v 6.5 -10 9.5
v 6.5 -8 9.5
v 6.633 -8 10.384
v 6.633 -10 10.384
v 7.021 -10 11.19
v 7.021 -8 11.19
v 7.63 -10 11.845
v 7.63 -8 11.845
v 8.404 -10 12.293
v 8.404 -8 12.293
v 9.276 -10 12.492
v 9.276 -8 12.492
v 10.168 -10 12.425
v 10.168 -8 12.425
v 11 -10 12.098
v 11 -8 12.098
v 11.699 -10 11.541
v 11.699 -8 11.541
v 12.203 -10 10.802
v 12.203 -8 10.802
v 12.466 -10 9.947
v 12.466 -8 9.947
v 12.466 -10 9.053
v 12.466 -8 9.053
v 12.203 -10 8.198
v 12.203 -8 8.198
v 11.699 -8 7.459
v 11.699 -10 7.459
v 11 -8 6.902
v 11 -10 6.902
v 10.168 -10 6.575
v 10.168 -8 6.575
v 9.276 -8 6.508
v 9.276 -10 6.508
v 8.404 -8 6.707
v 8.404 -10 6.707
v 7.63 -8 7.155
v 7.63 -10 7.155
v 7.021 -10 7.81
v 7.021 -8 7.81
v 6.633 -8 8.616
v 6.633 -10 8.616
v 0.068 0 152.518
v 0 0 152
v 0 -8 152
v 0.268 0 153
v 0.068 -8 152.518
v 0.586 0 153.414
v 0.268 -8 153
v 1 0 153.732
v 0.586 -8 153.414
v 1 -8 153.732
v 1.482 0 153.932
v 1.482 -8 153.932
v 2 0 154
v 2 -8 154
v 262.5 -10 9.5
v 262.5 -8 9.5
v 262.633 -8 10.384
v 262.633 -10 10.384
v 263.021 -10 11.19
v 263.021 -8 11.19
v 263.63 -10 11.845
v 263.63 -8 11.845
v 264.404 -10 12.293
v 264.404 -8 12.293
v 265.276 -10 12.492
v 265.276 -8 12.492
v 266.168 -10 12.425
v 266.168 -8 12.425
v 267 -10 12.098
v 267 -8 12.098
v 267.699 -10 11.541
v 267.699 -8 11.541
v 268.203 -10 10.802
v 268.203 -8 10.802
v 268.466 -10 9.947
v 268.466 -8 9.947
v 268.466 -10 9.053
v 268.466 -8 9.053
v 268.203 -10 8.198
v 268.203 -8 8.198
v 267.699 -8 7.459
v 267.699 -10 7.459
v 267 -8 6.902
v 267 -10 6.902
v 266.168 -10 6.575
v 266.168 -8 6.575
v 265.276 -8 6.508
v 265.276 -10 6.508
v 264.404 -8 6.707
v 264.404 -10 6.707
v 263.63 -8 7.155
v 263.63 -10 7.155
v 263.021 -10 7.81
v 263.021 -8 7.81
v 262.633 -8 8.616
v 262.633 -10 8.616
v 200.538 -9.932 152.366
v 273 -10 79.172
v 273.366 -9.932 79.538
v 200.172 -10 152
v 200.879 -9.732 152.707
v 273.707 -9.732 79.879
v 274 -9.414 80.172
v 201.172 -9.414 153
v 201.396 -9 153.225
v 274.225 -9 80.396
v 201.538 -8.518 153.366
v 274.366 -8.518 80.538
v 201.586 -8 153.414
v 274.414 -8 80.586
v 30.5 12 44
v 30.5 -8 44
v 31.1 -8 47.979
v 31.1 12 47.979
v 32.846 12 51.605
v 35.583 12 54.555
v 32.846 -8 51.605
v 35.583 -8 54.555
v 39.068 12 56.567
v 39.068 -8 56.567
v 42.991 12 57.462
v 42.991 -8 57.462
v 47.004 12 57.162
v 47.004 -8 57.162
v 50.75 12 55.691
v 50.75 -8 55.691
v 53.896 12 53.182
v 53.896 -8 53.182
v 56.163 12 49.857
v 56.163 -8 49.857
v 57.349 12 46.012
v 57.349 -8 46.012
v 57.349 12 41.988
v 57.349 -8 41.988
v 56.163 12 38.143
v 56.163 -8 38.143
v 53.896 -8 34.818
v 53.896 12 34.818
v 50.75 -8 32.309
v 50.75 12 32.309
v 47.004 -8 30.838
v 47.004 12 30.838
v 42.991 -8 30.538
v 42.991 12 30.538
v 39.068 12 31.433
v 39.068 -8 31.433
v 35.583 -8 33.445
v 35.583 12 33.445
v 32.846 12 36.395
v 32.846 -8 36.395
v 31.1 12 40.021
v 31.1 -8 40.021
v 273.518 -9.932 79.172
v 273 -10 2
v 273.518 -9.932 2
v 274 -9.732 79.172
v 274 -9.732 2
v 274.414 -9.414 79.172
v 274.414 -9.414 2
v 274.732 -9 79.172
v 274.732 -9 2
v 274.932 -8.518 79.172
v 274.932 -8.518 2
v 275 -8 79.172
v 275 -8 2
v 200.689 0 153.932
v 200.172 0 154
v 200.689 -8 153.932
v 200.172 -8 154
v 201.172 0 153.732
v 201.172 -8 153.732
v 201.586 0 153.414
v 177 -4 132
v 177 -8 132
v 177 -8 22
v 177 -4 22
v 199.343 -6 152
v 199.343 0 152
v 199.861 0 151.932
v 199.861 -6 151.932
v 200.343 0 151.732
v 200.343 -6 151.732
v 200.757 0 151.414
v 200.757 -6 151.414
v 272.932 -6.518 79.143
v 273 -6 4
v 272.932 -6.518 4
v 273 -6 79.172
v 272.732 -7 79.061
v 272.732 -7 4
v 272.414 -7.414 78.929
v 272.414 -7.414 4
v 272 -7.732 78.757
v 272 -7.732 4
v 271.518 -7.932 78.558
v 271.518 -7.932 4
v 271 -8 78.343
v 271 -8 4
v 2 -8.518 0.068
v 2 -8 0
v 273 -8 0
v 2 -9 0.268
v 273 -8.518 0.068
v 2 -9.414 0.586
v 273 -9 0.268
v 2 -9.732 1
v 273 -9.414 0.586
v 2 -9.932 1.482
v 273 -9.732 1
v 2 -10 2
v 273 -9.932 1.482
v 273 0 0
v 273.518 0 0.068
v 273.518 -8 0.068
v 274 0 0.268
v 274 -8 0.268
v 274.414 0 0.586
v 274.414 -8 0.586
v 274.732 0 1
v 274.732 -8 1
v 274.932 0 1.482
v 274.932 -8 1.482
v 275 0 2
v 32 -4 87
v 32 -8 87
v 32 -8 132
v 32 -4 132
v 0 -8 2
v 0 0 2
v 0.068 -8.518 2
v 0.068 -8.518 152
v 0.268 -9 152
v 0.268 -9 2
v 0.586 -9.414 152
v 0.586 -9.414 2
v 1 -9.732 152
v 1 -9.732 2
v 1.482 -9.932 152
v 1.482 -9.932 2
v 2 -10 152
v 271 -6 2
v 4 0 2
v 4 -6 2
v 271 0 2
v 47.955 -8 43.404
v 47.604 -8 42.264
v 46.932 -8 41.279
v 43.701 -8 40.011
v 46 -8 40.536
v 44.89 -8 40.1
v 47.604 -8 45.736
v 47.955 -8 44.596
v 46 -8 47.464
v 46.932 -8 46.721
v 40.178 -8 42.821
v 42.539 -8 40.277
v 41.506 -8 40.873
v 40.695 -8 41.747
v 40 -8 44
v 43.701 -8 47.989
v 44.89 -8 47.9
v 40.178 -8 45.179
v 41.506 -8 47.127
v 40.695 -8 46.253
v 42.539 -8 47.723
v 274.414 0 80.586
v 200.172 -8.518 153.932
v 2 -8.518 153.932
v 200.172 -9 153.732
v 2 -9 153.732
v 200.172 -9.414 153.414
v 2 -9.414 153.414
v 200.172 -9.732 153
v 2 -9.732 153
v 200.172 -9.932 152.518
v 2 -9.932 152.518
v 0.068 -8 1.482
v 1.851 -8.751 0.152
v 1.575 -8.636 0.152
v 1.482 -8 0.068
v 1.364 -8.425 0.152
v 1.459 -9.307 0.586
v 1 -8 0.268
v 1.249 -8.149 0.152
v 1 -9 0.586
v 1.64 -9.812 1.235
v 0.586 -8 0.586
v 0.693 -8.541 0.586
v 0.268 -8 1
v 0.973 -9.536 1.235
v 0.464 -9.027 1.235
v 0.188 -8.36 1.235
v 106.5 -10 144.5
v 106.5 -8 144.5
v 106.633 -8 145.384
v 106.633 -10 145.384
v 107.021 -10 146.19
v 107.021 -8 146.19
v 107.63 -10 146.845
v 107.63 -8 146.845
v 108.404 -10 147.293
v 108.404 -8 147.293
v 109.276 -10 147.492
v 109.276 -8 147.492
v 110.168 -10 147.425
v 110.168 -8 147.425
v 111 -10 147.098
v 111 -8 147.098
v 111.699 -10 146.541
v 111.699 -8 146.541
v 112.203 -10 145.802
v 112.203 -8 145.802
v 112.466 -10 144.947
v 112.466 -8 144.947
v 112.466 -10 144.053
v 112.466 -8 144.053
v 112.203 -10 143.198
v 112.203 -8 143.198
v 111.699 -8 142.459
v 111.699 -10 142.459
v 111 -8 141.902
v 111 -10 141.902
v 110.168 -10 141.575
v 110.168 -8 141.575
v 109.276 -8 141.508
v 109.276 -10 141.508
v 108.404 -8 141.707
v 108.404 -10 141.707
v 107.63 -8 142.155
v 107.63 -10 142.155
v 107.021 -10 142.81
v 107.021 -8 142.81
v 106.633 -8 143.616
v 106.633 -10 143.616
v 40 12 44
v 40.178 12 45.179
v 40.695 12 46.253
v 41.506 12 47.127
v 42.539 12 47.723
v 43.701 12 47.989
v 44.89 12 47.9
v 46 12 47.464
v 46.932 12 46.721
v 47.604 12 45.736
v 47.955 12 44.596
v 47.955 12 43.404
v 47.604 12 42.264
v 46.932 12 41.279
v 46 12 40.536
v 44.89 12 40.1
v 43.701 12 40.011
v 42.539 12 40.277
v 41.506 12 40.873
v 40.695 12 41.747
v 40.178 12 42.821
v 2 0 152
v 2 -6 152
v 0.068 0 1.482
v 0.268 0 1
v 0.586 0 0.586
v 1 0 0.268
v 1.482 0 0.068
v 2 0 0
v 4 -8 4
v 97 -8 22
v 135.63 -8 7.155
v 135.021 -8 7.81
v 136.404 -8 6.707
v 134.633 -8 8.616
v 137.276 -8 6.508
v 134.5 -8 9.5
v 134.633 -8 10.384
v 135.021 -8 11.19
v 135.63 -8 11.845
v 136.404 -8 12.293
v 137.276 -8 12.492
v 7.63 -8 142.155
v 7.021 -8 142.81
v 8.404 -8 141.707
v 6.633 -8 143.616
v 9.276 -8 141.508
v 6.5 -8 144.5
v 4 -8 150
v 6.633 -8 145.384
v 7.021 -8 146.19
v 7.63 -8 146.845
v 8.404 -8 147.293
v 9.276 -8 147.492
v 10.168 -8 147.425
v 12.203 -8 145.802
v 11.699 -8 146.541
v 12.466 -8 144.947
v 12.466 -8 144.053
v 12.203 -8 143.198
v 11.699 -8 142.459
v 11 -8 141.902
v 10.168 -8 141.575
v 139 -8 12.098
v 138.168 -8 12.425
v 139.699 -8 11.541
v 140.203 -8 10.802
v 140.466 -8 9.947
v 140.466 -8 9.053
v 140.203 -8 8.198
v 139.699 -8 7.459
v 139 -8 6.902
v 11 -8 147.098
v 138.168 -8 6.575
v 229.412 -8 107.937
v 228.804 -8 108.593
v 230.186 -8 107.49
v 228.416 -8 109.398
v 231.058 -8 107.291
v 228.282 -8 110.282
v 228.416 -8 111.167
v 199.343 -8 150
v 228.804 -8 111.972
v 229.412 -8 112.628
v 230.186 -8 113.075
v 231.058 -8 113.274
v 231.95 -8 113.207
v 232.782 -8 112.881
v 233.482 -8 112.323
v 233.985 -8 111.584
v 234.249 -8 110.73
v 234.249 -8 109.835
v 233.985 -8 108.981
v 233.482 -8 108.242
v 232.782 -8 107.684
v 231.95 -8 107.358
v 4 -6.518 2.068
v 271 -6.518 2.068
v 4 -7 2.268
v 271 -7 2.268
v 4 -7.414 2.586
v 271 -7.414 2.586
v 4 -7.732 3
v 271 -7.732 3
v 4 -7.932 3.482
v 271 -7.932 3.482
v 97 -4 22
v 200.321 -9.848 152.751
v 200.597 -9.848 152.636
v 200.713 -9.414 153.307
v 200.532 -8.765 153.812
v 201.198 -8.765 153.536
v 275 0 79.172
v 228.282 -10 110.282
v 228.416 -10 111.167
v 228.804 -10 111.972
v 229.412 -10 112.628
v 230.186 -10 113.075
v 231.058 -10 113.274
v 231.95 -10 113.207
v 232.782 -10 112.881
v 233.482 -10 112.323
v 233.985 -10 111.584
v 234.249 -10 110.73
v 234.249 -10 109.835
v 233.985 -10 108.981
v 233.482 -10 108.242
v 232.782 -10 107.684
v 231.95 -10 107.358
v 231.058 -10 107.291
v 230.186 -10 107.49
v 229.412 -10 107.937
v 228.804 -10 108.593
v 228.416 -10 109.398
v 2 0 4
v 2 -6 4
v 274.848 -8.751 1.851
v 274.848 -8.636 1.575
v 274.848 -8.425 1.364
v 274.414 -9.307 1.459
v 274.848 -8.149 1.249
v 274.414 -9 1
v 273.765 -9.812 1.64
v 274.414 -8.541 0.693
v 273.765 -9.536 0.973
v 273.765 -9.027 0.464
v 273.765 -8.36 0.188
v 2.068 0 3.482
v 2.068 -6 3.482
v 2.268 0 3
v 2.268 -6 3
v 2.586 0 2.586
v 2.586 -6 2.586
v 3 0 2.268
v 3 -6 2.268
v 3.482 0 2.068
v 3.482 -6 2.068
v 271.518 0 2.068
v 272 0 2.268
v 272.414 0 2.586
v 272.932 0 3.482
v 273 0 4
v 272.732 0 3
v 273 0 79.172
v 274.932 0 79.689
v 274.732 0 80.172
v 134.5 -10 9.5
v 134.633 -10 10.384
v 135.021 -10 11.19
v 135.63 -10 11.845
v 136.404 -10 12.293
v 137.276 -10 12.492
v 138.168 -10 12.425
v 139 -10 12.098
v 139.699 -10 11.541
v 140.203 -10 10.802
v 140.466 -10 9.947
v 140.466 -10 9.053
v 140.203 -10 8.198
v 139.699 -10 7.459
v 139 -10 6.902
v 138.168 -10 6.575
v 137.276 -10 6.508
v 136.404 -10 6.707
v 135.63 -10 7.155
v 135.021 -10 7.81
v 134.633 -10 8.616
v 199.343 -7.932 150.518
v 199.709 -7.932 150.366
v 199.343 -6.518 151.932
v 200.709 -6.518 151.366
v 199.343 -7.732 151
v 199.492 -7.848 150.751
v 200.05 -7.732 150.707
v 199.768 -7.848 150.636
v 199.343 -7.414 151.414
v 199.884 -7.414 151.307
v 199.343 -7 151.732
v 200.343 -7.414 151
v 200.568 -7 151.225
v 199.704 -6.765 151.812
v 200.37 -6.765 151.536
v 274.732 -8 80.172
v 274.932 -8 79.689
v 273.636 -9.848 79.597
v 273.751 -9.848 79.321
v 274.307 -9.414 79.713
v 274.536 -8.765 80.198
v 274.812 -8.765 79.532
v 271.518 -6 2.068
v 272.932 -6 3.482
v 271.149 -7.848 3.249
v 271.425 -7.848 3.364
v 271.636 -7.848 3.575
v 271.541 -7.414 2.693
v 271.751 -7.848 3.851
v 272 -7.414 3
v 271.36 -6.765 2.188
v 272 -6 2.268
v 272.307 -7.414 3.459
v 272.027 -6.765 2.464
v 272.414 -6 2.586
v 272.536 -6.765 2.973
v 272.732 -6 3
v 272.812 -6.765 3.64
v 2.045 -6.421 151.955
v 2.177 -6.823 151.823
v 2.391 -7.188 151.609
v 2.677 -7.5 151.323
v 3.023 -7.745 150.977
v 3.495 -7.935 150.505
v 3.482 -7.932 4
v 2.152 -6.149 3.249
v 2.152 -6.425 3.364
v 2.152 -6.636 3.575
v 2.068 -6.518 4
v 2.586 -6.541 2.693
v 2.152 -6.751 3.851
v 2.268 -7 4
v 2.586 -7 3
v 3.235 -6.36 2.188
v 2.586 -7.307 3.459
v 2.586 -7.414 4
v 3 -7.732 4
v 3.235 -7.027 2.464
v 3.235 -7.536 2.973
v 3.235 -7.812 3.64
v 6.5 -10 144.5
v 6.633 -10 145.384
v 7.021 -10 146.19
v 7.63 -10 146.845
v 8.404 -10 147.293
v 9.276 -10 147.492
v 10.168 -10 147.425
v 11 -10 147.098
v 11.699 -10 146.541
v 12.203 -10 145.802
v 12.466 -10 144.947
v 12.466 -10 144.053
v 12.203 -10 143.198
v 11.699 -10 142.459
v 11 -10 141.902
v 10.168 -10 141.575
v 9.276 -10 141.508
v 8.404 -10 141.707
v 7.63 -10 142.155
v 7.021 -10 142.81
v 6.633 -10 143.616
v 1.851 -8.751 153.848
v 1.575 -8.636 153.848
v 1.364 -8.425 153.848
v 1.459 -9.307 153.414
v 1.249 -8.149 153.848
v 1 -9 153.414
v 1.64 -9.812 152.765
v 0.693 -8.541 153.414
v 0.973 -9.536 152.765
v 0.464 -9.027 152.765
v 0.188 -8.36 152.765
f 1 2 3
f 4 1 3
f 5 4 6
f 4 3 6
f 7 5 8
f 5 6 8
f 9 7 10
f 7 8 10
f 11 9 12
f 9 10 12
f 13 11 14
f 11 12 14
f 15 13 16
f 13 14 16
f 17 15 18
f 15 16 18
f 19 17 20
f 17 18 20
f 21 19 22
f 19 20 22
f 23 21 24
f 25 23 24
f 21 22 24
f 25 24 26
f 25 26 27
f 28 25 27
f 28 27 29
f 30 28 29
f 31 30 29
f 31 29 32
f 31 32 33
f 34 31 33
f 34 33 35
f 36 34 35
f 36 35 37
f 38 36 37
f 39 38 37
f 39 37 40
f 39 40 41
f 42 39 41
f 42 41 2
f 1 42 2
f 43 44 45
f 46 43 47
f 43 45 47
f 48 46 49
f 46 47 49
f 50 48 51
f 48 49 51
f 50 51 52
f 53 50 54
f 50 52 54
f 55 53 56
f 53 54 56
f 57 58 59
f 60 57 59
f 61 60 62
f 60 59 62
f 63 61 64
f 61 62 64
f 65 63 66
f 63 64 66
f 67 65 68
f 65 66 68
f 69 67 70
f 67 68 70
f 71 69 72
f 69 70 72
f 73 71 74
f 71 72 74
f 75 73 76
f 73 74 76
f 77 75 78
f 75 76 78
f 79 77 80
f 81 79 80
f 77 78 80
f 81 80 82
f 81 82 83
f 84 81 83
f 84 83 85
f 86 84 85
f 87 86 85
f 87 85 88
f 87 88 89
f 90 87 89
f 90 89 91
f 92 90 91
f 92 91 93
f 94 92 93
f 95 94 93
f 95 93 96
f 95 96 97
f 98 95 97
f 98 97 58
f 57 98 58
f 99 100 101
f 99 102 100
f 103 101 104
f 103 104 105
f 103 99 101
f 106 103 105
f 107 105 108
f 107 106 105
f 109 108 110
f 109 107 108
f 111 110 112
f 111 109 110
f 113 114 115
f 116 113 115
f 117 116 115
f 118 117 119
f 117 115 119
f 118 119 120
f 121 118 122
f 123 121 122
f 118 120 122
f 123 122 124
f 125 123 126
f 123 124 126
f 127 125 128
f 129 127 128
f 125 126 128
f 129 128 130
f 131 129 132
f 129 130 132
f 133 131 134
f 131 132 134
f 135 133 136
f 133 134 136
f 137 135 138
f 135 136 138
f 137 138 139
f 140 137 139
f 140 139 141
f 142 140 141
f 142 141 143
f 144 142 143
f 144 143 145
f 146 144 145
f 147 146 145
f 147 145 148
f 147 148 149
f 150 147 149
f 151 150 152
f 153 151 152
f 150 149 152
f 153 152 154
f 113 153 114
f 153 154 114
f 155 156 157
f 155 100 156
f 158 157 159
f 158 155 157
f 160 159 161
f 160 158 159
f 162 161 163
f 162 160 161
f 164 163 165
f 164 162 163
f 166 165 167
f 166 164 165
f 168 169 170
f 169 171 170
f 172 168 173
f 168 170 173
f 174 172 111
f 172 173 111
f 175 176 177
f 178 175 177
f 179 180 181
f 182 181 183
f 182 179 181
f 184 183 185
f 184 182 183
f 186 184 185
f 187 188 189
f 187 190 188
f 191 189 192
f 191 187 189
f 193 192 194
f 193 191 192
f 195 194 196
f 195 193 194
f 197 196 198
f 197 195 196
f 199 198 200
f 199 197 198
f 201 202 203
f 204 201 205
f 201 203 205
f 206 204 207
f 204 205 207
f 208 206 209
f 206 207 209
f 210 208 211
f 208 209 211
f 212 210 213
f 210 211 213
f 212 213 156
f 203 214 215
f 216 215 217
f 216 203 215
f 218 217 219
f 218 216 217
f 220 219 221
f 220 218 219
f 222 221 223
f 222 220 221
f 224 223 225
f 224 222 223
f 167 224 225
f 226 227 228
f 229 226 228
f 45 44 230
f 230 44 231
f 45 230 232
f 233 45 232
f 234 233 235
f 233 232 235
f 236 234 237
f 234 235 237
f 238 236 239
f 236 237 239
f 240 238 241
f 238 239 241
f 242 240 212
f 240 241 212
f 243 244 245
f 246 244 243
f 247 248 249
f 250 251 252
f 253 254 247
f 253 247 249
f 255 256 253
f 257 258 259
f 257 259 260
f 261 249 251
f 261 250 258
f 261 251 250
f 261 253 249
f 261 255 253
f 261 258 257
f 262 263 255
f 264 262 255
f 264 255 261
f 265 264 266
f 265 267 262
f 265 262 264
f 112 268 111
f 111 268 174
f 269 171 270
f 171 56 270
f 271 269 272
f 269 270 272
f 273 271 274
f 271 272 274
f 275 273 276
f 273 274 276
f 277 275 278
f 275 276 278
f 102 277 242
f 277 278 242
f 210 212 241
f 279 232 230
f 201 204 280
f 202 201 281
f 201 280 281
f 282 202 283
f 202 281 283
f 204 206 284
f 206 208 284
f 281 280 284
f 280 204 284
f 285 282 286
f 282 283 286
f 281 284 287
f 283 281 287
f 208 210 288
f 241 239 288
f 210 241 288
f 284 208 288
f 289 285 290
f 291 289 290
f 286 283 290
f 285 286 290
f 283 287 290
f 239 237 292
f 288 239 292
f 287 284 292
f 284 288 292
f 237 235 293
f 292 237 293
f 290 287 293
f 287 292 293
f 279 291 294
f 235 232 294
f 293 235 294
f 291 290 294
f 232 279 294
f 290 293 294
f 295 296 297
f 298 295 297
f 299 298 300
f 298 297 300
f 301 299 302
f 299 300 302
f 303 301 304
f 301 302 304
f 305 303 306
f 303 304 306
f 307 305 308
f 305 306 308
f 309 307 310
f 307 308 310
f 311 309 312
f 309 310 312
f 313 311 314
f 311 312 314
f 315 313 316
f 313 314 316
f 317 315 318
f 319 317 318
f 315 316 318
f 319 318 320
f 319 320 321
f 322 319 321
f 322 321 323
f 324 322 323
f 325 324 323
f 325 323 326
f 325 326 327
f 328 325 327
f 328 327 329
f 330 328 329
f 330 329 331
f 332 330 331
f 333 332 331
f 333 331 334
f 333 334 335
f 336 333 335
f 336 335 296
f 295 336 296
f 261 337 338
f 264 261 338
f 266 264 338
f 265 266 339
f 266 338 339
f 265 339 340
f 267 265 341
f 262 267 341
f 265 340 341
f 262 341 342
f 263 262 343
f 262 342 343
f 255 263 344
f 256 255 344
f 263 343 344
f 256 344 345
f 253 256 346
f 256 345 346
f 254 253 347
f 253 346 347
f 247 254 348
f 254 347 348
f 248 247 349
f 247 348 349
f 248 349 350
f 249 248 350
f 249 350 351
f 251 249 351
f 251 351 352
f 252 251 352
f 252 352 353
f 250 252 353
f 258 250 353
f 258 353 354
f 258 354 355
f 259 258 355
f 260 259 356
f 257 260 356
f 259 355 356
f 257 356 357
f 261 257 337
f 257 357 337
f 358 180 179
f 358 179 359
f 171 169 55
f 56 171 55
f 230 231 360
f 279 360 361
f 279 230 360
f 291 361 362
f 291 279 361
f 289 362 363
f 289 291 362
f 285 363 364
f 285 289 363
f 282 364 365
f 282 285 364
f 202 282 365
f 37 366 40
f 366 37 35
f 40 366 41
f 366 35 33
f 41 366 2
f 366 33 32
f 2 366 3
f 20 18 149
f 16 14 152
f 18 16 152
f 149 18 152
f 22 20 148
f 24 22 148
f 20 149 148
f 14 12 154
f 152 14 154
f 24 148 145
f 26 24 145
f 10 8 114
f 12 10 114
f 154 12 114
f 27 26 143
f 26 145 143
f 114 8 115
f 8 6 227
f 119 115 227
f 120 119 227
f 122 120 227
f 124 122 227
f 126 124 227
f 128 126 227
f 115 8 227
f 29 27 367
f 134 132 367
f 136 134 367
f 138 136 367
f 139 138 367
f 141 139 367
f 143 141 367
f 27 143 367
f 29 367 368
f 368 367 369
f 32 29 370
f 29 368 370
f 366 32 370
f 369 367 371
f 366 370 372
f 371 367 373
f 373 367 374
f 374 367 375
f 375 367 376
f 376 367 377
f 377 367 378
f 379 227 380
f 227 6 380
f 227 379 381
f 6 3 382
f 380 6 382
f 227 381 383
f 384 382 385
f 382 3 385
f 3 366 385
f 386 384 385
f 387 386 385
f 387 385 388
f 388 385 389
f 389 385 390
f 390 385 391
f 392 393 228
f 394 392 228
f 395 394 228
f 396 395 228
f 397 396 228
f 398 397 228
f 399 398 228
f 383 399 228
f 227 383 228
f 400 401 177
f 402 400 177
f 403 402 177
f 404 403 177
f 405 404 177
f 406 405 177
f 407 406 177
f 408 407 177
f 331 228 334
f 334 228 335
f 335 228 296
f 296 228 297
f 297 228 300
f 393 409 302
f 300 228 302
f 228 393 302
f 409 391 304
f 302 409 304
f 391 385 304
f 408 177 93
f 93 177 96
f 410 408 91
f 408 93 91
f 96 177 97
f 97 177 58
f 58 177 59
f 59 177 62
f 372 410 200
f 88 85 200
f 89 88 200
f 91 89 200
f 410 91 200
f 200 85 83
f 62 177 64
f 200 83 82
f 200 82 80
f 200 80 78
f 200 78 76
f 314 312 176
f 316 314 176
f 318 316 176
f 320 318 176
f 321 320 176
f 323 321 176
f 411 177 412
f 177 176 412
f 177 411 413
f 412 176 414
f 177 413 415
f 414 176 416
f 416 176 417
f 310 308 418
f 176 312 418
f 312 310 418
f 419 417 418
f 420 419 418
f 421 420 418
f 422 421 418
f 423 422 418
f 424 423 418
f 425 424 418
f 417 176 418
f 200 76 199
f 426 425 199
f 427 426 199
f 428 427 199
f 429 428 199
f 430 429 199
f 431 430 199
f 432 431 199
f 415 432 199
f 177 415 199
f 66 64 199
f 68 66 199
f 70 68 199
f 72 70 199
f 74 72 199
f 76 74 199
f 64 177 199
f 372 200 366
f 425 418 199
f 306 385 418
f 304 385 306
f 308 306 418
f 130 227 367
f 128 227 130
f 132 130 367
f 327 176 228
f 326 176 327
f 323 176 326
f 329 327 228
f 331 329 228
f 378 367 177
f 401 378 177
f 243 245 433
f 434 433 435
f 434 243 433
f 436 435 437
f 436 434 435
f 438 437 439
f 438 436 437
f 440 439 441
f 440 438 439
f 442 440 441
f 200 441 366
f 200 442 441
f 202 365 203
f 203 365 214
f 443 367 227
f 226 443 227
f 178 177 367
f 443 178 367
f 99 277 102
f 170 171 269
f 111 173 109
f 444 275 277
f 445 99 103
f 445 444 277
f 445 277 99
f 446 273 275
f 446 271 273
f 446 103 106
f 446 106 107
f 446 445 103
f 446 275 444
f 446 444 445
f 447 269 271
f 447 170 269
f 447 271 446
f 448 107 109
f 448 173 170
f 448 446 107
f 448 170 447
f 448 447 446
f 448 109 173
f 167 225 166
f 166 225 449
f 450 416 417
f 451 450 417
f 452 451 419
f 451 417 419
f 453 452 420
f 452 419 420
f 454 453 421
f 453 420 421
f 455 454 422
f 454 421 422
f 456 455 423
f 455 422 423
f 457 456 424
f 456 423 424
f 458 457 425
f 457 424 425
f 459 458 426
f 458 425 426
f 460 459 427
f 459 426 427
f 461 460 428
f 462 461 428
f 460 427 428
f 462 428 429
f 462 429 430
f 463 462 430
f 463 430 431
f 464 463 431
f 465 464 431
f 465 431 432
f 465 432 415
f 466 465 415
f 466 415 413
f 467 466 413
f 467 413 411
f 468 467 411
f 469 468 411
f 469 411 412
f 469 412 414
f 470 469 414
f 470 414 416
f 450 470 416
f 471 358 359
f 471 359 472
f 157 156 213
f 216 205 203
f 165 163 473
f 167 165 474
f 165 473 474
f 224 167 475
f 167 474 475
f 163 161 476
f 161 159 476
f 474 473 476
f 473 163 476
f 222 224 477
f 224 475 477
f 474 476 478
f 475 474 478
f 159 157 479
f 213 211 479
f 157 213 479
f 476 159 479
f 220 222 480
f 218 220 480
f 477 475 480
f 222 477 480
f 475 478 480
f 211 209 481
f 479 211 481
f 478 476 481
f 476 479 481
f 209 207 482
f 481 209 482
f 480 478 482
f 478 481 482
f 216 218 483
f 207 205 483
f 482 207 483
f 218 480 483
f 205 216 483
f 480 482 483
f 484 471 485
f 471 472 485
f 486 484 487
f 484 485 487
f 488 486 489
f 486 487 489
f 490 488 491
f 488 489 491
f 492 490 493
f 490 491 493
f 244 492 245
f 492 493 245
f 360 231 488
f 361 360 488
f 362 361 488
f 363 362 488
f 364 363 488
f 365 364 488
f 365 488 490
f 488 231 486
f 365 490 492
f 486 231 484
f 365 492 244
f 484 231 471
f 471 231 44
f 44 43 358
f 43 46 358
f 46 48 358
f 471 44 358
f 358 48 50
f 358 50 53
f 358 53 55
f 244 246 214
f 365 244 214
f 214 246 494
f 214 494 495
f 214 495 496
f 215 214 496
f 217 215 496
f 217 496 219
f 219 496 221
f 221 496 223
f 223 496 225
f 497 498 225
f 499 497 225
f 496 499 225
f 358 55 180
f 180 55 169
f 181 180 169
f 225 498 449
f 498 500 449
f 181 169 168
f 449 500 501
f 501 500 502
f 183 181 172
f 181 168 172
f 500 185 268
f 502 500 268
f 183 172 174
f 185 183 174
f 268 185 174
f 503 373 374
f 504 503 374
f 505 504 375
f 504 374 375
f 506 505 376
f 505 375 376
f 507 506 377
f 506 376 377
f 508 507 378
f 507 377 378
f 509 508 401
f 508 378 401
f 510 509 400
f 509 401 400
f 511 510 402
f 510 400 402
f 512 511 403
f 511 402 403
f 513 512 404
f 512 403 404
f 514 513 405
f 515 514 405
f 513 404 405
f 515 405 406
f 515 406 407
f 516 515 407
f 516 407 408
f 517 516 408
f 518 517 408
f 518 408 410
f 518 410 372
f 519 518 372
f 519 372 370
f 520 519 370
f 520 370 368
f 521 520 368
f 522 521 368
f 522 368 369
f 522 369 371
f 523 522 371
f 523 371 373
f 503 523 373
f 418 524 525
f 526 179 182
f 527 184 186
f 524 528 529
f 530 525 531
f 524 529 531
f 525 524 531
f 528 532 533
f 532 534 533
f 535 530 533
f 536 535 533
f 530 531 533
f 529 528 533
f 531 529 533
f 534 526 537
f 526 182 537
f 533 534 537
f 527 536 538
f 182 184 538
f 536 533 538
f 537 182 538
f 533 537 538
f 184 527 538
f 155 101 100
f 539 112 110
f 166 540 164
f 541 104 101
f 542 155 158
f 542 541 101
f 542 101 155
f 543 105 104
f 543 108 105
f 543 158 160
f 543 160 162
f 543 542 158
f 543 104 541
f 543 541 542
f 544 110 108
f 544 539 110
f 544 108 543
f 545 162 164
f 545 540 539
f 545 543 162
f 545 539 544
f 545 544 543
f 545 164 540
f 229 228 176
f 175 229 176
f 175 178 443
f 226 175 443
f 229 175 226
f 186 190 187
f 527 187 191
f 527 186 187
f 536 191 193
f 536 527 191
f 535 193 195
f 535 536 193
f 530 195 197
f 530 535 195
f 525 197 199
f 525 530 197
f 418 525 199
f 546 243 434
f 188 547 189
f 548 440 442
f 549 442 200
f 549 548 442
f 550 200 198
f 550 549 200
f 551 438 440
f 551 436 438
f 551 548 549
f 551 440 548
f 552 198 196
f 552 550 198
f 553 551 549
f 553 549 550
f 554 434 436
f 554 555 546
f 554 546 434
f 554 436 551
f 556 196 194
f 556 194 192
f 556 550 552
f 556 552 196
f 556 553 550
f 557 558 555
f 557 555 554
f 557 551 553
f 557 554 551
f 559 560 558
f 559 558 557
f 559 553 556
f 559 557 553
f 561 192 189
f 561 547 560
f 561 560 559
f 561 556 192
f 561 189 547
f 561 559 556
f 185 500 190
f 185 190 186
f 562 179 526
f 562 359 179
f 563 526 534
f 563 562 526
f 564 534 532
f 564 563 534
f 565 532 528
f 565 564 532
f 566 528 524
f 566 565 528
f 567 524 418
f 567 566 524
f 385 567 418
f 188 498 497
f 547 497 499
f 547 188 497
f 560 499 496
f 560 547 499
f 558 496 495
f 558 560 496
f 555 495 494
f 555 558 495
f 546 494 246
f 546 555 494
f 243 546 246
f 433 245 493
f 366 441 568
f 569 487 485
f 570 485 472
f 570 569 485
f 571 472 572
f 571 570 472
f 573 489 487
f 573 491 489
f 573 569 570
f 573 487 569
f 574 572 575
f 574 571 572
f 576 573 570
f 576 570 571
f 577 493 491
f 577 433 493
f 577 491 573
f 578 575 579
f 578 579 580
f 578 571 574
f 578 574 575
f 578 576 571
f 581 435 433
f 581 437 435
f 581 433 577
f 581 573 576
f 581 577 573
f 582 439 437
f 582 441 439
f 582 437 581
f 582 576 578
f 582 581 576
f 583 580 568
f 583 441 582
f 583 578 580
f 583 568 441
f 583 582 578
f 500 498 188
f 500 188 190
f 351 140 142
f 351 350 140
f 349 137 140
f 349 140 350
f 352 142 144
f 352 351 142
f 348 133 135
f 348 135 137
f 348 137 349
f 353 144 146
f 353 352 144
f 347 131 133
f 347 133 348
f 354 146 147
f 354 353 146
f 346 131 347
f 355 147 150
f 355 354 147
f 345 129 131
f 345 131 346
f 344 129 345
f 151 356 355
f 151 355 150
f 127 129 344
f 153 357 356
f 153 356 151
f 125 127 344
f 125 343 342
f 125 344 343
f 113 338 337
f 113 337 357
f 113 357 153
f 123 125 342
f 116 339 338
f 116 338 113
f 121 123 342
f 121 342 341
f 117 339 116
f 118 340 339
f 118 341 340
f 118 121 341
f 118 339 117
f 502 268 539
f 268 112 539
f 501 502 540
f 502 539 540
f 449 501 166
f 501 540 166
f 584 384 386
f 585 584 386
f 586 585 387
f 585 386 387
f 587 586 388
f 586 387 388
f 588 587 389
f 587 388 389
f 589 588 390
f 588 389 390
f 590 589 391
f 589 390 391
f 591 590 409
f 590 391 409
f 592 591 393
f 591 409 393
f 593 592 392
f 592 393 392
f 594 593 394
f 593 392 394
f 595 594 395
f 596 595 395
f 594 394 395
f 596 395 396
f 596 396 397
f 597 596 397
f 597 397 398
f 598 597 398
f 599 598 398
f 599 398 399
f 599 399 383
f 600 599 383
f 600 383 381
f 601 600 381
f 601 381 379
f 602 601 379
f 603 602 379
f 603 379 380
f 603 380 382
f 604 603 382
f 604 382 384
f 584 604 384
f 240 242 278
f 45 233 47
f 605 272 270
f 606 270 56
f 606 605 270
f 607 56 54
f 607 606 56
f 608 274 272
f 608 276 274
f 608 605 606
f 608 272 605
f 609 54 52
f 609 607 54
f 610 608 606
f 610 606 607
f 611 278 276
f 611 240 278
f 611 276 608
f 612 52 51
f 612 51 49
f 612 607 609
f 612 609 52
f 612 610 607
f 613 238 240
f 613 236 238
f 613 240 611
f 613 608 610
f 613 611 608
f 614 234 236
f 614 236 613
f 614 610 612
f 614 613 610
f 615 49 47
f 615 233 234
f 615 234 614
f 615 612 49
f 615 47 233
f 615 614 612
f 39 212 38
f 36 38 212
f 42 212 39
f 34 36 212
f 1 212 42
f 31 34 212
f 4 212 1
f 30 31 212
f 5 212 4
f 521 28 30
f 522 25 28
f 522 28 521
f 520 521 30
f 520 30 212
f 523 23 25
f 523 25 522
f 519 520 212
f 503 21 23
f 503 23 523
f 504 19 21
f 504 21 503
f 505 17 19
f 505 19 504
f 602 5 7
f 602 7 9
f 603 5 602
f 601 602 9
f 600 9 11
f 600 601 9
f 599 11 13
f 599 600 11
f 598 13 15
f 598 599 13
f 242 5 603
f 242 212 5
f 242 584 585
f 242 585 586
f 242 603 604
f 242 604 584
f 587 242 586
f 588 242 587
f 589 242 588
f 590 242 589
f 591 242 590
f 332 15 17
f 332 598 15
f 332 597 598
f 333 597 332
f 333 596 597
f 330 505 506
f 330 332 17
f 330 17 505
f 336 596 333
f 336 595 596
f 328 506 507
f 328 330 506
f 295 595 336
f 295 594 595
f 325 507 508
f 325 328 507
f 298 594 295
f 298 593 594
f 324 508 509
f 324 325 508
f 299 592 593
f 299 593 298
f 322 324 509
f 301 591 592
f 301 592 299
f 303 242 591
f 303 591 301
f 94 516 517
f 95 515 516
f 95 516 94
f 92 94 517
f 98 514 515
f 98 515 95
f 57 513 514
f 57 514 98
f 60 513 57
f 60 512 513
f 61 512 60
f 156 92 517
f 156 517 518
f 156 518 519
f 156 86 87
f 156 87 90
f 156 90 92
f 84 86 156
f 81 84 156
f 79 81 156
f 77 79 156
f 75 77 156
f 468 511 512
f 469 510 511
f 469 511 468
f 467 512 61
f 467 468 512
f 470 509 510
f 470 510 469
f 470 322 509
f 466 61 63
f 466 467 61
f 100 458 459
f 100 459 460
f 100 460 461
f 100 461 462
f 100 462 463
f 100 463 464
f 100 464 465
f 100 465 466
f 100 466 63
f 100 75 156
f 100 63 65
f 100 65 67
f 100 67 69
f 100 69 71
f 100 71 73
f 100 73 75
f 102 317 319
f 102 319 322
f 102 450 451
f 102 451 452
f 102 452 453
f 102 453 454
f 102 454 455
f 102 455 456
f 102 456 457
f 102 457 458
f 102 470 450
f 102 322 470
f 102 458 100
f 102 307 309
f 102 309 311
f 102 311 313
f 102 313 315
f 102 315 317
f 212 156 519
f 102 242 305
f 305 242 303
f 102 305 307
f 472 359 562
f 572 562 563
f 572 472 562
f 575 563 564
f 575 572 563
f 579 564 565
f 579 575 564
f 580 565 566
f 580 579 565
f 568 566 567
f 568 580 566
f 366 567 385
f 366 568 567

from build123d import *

# Parameters (mm, degrees)
F1_DEPTH = 10
F2_T     = -2
F5_DEPTH = 4
F6_R     = 13.5
F7_DEPTH = 20
F8_R     = 4
F9_DEPTH = 20
F11_D    = 6
F12_R    = 2
F13_R    = 2


with BuildPart() as f1:
    # F0 (on Front) → F1 (new body)
    with BuildSketch(Plane.XZ):
        Polygon((0, 154), (0, 0), (275, 0), (275, 80), (201, 154), align=None)
    extrude(amount=F1_DEPTH)

    # F2
    f2_openings = [f1.faces().sort_by_distance(p)[0] for p in [
        (129.700907, 0, 73.382695),
    ]]
    offset(amount=F2_T, openings=f2_openings)

    # F4 (on face) → F5 (join)
    with BuildSketch(Plane(origin=(0, -8, 0), x_dir=(-1, 0, 0), z_dir=(0, 1, 0))):
        Polygon((-32, 87), (-32, 132), (-177, 132), (-177, 22), (-97, 22), align=None)
    extrude(amount=F5_DEPTH)

    # F6 (on face) → F7 (join)
    with BuildSketch(Plane(origin=(0, -8, 0), x_dir=(-1, 0, 0), z_dir=(0, 1, 0))):
        with Locations((-44, 44)):
            Circle(F6_R)
    extrude(amount=F7_DEPTH)

    # F8 (on face) → F9 (cut, through all)
    with BuildSketch(Plane(origin=(0, 12, 0), x_dir=(-1, 0, 0), z_dir=(0, 1, 0))):
        with Locations((-44, 44)):
            Circle(F8_R)
    extrude(amount=-F9_DEPTH, mode=Mode.SUBTRACT)

    # F11 (through all)
    with Locations(Plane.XZ.offset(10)):
        with Locations((9.5, 144.5), (109.5, 144.5), (231.2824855787, 110.2824855787), (265.5, 9.5), (137.5, 9.5), (9.5, 9.5)):
            Hole(F11_D / 2)

    # F12
    f12_edges = [f1.edges().sort_by_distance(p)[0] for p in [
        (0, -10, 77),
        (137.5, -10, 0),
        (238, -10, 117),
        (275, -10, 40),
        (275, -5, 0),
        (275, -5, 80),
        (201, -5, 154),
        (0, -5, 0),
        (100.5, -10, 154),
        (0, -5, 154),
    ]]
    fillet(f12_edges, radius=F12_R)

    # F13
    f13_edges = [f1.edges().sort_by_distance(p)[0] for p in [
        (273, -4, 2),
        (137.5, -8, 2),
        (273, -8, 40.585786),
        (236.585786, -8, 115.585786),
        (200.171573, -4, 152),
        (101.085786, -8, 152),
        (2, -4, 2),
        (2, -8, 77),
    ]]
    fillet(f13_edges, radius=F13_R)


solid = f1.part
